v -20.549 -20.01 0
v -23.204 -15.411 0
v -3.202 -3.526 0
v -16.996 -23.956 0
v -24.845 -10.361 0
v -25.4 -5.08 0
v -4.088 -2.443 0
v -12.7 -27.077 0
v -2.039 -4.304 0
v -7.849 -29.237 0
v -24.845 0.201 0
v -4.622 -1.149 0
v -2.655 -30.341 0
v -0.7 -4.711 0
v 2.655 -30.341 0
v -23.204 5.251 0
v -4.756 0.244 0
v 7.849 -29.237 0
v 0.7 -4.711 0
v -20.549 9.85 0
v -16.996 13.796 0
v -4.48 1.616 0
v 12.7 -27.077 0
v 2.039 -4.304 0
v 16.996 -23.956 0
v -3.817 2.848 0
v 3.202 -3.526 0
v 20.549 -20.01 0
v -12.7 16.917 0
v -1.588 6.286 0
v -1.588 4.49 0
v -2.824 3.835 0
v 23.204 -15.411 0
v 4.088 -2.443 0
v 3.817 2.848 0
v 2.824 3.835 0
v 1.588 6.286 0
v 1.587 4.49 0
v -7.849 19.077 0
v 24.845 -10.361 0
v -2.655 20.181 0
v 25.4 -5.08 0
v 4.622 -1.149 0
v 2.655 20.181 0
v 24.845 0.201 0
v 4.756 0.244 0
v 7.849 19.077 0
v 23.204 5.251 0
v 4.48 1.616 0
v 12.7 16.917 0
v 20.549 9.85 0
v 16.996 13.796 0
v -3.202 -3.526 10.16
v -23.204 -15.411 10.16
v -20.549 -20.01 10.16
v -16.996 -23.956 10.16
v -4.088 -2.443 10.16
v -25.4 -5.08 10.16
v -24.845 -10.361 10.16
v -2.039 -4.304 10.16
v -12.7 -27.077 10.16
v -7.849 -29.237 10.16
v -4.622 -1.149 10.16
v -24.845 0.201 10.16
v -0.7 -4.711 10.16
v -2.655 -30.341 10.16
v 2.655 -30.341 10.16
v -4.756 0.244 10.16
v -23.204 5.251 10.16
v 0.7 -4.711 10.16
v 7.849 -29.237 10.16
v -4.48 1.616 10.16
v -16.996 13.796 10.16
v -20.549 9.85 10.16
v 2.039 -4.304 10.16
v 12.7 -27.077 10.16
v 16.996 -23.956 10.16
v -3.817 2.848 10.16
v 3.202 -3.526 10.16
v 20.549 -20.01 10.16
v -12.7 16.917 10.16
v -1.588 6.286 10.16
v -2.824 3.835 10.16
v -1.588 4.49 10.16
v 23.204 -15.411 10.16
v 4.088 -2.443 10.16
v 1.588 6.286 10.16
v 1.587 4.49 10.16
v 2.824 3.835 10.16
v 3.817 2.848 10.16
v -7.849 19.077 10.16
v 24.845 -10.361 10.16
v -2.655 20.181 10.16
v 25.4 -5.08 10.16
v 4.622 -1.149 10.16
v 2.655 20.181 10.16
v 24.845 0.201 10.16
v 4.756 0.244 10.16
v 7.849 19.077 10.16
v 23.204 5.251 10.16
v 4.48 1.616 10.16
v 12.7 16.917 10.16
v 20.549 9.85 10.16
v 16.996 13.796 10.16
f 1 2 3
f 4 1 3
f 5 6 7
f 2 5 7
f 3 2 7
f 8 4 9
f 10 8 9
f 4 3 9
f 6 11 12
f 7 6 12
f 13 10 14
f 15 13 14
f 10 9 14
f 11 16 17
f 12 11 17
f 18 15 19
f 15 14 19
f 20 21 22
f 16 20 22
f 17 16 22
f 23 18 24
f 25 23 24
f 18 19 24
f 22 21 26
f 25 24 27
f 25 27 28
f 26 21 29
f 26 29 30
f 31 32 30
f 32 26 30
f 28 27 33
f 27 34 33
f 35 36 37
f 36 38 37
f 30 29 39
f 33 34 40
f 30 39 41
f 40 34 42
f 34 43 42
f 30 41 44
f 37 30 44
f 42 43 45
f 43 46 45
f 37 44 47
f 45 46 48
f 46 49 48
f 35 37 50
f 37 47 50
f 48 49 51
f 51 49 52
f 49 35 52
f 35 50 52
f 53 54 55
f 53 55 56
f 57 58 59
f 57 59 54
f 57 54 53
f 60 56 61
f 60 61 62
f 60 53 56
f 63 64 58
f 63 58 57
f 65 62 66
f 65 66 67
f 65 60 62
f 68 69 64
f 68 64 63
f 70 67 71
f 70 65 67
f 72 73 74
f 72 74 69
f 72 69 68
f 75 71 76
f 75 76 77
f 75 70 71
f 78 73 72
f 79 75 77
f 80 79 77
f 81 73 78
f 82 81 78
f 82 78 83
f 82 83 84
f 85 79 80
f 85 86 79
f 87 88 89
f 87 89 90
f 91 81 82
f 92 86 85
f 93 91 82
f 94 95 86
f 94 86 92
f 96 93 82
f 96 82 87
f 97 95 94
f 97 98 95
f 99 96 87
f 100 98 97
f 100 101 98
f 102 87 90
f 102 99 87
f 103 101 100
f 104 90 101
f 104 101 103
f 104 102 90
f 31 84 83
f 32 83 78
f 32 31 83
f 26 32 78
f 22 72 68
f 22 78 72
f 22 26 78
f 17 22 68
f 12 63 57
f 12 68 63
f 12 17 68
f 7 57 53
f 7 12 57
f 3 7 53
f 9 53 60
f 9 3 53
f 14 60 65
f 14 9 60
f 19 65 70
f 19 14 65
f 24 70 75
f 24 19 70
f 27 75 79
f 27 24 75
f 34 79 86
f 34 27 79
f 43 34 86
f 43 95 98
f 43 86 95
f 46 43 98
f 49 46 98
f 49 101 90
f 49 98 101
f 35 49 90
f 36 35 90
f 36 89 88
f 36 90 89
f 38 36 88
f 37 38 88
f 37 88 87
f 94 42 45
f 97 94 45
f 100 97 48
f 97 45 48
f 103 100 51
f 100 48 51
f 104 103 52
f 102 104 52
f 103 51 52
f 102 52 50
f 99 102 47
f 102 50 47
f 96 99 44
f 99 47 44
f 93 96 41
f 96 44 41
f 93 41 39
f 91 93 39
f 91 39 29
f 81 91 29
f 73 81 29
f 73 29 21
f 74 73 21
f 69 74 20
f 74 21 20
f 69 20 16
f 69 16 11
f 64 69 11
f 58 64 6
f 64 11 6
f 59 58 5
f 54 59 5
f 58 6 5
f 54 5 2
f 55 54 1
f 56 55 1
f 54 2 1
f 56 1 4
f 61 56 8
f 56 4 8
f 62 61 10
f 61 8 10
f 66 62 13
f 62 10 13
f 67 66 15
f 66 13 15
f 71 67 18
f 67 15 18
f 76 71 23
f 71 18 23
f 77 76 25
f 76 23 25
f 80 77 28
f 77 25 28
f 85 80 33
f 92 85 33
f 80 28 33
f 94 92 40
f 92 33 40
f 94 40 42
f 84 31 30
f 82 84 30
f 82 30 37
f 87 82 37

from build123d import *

# Parameters (mm, degrees)
SKETCH1_R               = 25.4
BOSS_EXTRUDE1_DEPTH     = 10.16
CUT_EXTRUDE2_DEPTH      = 12.16
CUT_EXTRUDE2_DEPTH_BACK = 12.16
SKETCH2_R               = 4.7625
CUT_EXTRUDE4_DEPTH      = 12.16
CUT_EXTRUDE4_DEPTH_BACK = 12.16
SKETCH3_W               = 3.175
SKETCH3_H               = 3.90525


with BuildPart() as part:
    # Sketch1 → Boss-Extrude1 (new body)
    with BuildSketch(Plane.XY):
        with Locations((0, -5.08)):
            Circle(SKETCH1_R)
    extrude(amount=BOSS_EXTRUDE1_DEPTH)

    # Sketch2 → Cut-Extrude2 (cut, two sides: drawn at the far end of the back side and taken through both)
    with BuildSketch(Plane.XY.offset(-CUT_EXTRUDE2_DEPTH_BACK)):
        Circle(SKETCH2_R)
    extrude(amount=CUT_EXTRUDE2_DEPTH + CUT_EXTRUDE2_DEPTH_BACK, mode=Mode.SUBTRACT)

    # Sketch3 → Cut-Extrude4 (cut, two sides: drawn at the far end of the back side and taken through both)
    with BuildSketch(Plane.XY.offset(-CUT_EXTRUDE4_DEPTH_BACK)):
        with Locations((0, 4.333875)):
            Rectangle(SKETCH3_W, SKETCH3_H)
    extrude(amount=CUT_EXTRUDE4_DEPTH + CUT_EXTRUDE4_DEPTH_BACK, mode=Mode.SUBTRACT)


solid = part.part
